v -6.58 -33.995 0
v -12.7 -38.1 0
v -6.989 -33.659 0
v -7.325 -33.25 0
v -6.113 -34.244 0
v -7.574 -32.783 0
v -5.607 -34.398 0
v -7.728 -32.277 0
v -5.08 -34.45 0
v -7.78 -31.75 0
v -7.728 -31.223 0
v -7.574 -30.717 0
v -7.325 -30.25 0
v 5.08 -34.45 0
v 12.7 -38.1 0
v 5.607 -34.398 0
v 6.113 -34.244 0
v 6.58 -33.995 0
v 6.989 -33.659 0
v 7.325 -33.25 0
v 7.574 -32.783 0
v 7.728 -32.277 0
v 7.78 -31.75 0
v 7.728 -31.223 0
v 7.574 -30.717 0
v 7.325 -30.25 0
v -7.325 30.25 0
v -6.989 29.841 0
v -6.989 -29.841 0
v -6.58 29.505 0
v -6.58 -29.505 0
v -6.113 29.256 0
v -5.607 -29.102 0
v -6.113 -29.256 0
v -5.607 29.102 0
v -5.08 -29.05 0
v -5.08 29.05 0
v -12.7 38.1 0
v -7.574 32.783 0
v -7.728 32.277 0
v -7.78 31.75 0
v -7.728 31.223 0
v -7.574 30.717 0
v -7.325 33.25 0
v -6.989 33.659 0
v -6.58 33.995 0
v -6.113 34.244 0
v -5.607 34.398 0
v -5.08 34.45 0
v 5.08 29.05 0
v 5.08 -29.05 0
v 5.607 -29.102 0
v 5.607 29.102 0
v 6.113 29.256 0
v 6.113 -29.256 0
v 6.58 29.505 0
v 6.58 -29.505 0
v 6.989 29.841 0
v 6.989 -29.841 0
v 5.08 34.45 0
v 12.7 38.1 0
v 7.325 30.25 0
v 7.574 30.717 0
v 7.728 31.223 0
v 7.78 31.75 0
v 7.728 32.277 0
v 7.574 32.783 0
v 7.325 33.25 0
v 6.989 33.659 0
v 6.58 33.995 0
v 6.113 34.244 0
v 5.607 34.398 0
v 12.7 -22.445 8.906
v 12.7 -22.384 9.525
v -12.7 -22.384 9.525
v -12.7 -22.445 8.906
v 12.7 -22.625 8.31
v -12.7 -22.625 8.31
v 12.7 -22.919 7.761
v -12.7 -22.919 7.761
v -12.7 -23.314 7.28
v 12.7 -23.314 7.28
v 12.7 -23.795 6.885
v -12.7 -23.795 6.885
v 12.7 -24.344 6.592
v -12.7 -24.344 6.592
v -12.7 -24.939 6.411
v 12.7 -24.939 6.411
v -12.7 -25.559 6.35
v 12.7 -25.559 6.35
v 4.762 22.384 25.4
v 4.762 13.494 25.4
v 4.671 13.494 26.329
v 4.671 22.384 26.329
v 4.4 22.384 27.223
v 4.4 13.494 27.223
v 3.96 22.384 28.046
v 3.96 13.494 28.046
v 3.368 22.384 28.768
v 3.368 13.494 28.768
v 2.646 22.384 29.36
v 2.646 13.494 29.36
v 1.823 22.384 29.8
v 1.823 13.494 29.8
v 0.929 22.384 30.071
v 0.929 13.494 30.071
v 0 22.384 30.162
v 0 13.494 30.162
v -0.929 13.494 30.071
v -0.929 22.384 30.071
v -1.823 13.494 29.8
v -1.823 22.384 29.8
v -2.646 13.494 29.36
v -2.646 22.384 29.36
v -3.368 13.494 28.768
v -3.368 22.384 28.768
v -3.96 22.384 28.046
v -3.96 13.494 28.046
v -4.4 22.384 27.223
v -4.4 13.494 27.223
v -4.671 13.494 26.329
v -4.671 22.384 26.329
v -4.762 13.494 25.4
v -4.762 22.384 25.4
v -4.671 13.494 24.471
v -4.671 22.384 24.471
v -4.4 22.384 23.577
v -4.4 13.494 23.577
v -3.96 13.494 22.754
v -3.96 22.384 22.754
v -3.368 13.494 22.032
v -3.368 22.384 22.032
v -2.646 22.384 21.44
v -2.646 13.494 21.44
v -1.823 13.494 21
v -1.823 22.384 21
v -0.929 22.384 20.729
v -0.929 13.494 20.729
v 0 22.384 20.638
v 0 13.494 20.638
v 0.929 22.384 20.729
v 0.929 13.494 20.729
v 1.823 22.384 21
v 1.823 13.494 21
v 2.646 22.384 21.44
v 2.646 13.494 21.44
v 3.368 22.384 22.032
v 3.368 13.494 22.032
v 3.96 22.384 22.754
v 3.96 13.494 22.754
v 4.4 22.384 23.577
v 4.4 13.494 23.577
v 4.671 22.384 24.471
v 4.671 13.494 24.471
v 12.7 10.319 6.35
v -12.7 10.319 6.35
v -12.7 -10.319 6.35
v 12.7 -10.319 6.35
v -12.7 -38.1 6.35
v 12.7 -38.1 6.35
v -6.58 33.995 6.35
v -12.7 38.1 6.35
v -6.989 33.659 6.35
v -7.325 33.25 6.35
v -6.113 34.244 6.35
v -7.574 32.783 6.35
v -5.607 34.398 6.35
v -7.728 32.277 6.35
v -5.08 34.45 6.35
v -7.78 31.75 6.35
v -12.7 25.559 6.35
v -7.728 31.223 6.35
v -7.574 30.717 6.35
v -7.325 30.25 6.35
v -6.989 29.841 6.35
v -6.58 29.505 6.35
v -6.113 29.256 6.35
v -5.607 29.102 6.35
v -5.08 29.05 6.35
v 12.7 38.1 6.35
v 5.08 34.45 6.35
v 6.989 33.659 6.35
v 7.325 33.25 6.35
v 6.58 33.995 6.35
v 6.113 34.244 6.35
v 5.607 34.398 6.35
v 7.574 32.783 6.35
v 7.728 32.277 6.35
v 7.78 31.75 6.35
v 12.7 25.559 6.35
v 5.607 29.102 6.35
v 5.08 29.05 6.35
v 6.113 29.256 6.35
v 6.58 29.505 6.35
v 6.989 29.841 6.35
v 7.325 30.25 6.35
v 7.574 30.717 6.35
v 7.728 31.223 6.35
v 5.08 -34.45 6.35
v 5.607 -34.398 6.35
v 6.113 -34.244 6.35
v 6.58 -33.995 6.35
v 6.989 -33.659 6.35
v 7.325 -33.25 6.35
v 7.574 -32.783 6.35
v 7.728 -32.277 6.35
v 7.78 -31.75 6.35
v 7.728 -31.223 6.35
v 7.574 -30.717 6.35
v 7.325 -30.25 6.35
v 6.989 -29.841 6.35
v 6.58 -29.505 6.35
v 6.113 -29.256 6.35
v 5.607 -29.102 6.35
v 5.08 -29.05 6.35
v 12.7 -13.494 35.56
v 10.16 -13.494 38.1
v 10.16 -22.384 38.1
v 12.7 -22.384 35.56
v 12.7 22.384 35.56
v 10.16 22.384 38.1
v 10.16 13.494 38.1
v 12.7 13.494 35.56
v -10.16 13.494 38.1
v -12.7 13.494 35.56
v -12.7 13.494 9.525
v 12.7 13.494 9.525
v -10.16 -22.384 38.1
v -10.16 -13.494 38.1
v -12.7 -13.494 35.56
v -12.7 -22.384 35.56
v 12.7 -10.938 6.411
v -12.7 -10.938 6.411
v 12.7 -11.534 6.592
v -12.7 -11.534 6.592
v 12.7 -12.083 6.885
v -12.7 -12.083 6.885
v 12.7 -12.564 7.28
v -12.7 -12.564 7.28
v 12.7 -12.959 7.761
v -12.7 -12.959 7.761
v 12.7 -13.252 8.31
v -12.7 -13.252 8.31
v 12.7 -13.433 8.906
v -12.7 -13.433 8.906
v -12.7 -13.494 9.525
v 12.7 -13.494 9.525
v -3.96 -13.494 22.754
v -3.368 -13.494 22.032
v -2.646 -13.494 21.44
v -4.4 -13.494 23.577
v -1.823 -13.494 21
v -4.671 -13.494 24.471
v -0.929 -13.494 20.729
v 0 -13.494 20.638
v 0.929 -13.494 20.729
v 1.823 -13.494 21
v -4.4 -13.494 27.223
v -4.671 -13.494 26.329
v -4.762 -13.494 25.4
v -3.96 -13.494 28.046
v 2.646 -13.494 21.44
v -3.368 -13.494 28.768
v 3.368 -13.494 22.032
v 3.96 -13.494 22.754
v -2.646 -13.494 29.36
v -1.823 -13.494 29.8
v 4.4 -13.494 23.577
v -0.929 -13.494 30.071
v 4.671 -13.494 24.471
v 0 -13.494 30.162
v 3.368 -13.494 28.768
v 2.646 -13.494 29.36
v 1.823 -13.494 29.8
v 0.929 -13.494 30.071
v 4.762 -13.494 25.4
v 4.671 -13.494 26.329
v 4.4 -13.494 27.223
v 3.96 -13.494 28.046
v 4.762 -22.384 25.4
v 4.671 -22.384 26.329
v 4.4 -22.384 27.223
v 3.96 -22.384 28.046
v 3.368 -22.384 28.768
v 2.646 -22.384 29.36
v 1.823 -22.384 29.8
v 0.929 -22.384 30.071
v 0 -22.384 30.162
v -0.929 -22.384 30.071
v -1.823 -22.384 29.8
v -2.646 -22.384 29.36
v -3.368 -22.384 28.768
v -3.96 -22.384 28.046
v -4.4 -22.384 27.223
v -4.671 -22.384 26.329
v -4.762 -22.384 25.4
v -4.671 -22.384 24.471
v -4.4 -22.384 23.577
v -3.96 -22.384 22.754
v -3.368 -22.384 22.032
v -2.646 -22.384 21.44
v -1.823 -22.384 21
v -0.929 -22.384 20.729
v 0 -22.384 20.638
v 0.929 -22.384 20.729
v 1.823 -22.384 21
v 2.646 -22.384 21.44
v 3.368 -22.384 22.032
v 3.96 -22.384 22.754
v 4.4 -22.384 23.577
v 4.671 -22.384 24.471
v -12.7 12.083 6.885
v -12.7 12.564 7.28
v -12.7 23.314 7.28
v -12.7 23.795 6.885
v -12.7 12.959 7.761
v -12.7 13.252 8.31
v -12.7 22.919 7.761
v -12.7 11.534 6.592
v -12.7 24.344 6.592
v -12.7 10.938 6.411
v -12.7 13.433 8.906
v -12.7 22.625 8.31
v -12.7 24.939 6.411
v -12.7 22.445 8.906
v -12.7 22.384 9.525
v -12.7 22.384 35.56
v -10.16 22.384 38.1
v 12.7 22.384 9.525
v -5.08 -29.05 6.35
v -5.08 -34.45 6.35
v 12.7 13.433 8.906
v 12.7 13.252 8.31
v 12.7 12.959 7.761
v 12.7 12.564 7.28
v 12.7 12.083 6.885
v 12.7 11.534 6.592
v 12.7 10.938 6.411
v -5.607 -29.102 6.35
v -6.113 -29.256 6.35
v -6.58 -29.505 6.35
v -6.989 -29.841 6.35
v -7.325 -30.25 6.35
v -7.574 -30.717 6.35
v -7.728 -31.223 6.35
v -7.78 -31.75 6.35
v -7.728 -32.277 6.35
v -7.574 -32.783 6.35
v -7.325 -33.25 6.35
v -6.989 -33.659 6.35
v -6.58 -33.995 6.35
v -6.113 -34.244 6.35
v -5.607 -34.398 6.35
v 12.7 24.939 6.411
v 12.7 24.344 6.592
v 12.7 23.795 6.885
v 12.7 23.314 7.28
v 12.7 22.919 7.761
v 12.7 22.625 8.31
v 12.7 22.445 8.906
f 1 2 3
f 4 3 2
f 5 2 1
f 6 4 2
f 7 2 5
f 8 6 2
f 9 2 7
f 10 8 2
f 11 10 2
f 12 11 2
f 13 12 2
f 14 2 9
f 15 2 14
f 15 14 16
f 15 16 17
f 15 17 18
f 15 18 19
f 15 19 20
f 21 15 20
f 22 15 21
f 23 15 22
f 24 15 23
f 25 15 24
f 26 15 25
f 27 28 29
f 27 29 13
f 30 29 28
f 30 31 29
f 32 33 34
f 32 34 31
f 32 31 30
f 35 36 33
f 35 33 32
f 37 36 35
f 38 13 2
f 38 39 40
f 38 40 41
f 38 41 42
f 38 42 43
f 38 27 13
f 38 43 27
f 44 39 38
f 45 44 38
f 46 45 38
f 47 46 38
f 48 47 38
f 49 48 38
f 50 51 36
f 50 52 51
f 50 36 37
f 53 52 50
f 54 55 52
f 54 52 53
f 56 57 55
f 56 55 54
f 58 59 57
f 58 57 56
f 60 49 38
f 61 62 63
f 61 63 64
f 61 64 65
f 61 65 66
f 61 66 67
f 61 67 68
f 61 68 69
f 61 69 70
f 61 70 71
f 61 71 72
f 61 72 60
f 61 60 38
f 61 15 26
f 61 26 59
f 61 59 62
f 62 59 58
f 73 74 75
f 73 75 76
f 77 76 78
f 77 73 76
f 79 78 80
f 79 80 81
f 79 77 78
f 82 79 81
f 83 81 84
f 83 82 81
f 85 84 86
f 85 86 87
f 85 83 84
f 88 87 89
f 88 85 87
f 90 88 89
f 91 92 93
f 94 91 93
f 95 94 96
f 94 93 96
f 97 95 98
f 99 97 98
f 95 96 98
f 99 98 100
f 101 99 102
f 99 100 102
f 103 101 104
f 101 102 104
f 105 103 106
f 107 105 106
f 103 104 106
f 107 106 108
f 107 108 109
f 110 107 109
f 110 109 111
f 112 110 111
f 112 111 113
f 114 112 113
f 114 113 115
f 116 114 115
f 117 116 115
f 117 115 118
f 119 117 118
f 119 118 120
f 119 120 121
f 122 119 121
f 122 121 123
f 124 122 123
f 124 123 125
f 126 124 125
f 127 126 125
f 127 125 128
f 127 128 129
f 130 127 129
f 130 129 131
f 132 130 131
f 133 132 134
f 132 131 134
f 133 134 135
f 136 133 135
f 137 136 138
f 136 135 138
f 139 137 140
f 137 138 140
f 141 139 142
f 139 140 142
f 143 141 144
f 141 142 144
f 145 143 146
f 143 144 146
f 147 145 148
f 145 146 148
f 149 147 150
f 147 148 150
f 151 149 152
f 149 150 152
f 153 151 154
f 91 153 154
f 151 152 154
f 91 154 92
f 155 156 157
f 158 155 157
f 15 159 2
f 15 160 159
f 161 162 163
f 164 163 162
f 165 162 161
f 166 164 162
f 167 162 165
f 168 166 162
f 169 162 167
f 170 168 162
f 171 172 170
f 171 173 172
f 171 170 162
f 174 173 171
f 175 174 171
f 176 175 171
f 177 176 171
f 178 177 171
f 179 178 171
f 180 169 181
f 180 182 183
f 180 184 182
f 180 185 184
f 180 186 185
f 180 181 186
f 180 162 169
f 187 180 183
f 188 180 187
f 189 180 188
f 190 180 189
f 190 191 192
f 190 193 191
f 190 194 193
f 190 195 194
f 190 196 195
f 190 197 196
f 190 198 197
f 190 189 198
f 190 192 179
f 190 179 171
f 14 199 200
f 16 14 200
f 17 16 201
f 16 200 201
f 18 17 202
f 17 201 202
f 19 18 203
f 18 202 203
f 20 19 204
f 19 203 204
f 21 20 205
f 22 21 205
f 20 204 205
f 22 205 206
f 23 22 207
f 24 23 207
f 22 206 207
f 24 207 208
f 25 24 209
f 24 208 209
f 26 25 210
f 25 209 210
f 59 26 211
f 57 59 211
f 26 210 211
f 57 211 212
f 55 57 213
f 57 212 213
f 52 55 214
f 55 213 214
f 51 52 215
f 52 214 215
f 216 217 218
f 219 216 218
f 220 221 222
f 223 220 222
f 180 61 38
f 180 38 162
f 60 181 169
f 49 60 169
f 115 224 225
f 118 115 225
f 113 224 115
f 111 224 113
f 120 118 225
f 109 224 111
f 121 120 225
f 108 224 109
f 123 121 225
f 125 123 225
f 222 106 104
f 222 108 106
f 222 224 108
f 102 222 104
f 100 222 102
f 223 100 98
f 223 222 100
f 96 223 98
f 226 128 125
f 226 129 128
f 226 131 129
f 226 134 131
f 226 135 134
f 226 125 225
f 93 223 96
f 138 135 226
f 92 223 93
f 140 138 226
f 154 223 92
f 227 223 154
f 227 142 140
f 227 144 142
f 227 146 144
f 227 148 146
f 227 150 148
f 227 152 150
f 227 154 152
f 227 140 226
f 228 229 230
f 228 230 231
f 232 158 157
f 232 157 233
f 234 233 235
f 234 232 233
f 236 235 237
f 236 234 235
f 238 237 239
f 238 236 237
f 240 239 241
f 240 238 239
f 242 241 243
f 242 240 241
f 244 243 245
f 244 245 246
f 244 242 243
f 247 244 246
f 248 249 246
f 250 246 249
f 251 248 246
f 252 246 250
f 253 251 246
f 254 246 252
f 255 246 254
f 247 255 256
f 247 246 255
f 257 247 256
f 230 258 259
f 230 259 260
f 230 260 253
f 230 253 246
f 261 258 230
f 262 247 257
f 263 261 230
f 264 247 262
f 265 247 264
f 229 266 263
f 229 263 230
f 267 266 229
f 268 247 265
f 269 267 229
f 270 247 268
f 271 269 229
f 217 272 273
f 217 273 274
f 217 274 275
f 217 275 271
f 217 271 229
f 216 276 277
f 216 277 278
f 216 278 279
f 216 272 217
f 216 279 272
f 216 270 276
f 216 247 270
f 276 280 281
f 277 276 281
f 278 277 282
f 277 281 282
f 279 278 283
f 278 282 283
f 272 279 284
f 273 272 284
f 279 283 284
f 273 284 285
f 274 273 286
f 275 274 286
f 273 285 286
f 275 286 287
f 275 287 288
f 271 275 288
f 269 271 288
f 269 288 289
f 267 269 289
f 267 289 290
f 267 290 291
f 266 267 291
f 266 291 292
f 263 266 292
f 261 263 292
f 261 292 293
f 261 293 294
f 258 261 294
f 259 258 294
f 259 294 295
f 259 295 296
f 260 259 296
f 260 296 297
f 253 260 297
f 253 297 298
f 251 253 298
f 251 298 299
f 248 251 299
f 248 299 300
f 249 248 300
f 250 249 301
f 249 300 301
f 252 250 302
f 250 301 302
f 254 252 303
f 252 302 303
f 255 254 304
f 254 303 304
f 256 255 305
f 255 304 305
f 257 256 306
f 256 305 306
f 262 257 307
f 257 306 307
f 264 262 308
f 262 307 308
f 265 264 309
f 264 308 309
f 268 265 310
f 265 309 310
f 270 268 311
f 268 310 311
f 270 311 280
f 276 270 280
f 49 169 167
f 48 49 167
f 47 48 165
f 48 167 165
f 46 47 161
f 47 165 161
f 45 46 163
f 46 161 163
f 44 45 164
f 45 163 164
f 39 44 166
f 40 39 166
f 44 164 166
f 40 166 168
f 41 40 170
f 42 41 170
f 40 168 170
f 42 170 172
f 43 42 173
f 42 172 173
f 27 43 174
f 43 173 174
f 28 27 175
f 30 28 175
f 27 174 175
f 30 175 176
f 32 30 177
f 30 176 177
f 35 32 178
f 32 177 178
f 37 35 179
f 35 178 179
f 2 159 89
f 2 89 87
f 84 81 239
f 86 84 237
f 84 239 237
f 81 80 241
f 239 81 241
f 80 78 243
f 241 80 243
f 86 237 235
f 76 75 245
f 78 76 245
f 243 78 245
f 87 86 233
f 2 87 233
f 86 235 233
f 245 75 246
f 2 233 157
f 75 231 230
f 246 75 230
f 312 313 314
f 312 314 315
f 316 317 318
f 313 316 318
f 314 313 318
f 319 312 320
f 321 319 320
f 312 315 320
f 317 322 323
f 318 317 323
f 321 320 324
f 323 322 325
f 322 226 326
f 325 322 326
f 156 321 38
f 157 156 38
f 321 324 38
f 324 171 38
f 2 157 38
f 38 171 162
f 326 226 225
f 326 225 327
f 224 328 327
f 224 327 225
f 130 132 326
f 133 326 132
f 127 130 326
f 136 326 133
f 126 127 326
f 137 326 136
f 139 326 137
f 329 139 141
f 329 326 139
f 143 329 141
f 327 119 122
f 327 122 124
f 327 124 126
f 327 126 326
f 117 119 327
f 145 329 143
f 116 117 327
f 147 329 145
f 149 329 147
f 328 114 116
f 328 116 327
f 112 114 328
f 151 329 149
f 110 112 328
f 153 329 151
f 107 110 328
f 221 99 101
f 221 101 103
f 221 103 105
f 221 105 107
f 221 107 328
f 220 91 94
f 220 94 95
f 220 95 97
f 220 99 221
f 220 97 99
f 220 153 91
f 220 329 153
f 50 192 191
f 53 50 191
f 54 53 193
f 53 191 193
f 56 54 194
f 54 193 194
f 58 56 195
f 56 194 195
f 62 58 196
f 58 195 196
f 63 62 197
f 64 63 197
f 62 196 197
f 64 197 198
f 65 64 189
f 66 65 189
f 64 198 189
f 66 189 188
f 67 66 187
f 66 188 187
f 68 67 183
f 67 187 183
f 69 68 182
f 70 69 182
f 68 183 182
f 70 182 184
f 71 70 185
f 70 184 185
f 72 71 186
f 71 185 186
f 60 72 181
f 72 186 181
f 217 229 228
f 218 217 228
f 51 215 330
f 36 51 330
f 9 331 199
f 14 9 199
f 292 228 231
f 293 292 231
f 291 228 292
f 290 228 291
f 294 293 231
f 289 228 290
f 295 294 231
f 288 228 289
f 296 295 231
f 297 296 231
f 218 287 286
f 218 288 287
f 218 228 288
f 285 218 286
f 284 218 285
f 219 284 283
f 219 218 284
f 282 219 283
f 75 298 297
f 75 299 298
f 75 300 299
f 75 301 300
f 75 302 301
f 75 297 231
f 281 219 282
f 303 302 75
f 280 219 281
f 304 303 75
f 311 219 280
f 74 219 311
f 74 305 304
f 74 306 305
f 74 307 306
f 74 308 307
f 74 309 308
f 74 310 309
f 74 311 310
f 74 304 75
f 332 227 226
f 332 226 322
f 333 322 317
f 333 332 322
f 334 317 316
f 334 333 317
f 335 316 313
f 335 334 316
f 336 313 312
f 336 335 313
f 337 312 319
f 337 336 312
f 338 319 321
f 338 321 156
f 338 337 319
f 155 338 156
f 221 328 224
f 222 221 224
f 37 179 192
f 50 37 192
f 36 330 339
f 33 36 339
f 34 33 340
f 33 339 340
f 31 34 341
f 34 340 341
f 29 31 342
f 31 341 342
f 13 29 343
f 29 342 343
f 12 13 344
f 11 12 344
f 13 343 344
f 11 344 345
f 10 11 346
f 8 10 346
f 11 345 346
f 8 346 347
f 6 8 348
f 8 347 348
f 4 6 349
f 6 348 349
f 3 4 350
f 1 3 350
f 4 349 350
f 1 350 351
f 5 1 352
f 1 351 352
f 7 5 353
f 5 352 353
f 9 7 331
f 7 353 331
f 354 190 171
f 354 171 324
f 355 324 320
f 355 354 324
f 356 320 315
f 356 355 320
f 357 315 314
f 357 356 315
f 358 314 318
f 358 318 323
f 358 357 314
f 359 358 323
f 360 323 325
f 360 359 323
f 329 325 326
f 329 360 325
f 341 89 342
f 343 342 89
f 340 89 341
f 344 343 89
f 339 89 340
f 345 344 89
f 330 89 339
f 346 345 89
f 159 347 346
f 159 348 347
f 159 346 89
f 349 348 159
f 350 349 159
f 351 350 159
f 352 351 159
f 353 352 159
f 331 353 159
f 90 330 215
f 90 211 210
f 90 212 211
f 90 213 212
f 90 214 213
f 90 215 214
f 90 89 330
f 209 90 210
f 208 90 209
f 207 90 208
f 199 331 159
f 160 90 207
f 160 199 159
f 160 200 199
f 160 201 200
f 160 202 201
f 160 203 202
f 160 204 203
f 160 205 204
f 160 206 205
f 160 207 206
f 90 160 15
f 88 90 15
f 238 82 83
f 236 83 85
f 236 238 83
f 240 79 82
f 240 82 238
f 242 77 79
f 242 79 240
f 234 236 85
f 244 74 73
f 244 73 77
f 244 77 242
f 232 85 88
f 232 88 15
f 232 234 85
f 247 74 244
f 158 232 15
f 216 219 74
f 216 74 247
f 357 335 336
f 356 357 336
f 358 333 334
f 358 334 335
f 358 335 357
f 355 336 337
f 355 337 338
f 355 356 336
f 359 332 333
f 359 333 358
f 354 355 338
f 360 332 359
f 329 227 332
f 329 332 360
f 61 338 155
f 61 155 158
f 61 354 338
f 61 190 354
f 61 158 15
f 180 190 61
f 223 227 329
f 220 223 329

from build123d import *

# Parameters (mm, degrees)
F1_DEPTH = 12.7
F2_R     = 4.7625
F3_DEPTH = 44.7675
F5_DEPTH = 6.35
F6_SIZE  = 2.54


with BuildPart() as f1:
    # F0 (on Right) → F1 (new body, symmetric)
    with BuildSketch(Plane.YZ):
        with BuildLine():
            Line((-38.1, 0), (0, 0))
            Line((0, 0), (38.1, 0))
            Line((38.1, 0), (38.1, 6.35))
            Line((38.1, 6.35), (25.55875, 6.35))
            ThreePointArc((25.55875, 6.35), (23.313686, 7.279936), (22.38375, 9.525))
            Line((22.38375, 9.525), (22.38375, 38.1))
            Line((22.38375, 38.1), (13.49375, 38.1))
            Line((13.49375, 38.1), (13.49375, 9.525))
            ThreePointArc((13.49375, 9.525), (12.563814, 7.279936), (10.31875, 6.35))
            Line((10.31875, 6.35), (0, 6.35))
            Line((0, 6.35), (-10.31875, 6.35))
            ThreePointArc((-10.31875, 6.35), (-12.563814, 7.279936), (-13.49375, 9.525))
            Line((-13.49375, 9.525), (-13.49375, 38.1))
            Line((-13.49375, 38.1), (-22.38375, 38.1))
            Line((-22.38375, 38.1), (-22.38375, 9.525))
            ThreePointArc((-22.38375, 9.525), (-23.313686, 7.279936), (-25.55875, 6.35))
            Line((-25.55875, 6.35), (-38.1, 6.35))
            Line((-38.1, 6.35), (-38.1, 0))
        make_face()
    extrude(amount=F1_DEPTH, both=True)

    # F2 (on face) → F3 (cut, through all)
    with BuildSketch(Plane.XZ.offset(22.38375)):
        with Locations((0, 25.4)):
            Circle(F2_R)
    extrude(amount=-F3_DEPTH, mode=Mode.SUBTRACT)

    # F4 (on face) → F5 (cut, through all)
    with BuildSketch(Plane.XY.offset(6.35)):
        with BuildLine():
            ThreePointArc((-5.08, 34.45), (-7.78, 31.75), (-5.08, 29.05))
            Line((-5.08, 29.05), (5.08, 29.05))
            ThreePointArc((5.08, 29.05), (7.78, 31.75), (5.08, 34.45))
            Line((5.08, 34.45), (-5.08, 34.45))
        make_face()
        with BuildLine():
            ThreePointArc((-5.08, -29.05), (-7.78, -31.75), (-5.08, -34.45))
            Line((-5.08, -34.45), (0, -34.45))
            Line((0, -34.45), (0, -29.05))
            Line((0, -29.05), (-5.08, -29.05))
        make_face()
        with BuildLine():
            Line((0, -29.05), (0, -34.45))
            Line((0, -34.45), (5.08, -34.45))
            ThreePointArc((5.08, -34.45), (7.78, -31.75), (5.08, -29.05))
            Line((5.08, -29.05), (0, -29.05))
        make_face()
    extrude(amount=-F5_DEPTH, mode=Mode.SUBTRACT)

    # F6
    f6_edges = [f1.edges().sort_by_distance(p)[0] for p in [
        (12.7, -17.93875, 38.1),
        (12.7, 17.93875, 38.1),
        (-12.7, -17.93875, 38.1),
        (-12.7, 17.93875, 38.1),
    ]]
    chamfer(f6_edges, length=F6_SIZE)


solid = f1.part
